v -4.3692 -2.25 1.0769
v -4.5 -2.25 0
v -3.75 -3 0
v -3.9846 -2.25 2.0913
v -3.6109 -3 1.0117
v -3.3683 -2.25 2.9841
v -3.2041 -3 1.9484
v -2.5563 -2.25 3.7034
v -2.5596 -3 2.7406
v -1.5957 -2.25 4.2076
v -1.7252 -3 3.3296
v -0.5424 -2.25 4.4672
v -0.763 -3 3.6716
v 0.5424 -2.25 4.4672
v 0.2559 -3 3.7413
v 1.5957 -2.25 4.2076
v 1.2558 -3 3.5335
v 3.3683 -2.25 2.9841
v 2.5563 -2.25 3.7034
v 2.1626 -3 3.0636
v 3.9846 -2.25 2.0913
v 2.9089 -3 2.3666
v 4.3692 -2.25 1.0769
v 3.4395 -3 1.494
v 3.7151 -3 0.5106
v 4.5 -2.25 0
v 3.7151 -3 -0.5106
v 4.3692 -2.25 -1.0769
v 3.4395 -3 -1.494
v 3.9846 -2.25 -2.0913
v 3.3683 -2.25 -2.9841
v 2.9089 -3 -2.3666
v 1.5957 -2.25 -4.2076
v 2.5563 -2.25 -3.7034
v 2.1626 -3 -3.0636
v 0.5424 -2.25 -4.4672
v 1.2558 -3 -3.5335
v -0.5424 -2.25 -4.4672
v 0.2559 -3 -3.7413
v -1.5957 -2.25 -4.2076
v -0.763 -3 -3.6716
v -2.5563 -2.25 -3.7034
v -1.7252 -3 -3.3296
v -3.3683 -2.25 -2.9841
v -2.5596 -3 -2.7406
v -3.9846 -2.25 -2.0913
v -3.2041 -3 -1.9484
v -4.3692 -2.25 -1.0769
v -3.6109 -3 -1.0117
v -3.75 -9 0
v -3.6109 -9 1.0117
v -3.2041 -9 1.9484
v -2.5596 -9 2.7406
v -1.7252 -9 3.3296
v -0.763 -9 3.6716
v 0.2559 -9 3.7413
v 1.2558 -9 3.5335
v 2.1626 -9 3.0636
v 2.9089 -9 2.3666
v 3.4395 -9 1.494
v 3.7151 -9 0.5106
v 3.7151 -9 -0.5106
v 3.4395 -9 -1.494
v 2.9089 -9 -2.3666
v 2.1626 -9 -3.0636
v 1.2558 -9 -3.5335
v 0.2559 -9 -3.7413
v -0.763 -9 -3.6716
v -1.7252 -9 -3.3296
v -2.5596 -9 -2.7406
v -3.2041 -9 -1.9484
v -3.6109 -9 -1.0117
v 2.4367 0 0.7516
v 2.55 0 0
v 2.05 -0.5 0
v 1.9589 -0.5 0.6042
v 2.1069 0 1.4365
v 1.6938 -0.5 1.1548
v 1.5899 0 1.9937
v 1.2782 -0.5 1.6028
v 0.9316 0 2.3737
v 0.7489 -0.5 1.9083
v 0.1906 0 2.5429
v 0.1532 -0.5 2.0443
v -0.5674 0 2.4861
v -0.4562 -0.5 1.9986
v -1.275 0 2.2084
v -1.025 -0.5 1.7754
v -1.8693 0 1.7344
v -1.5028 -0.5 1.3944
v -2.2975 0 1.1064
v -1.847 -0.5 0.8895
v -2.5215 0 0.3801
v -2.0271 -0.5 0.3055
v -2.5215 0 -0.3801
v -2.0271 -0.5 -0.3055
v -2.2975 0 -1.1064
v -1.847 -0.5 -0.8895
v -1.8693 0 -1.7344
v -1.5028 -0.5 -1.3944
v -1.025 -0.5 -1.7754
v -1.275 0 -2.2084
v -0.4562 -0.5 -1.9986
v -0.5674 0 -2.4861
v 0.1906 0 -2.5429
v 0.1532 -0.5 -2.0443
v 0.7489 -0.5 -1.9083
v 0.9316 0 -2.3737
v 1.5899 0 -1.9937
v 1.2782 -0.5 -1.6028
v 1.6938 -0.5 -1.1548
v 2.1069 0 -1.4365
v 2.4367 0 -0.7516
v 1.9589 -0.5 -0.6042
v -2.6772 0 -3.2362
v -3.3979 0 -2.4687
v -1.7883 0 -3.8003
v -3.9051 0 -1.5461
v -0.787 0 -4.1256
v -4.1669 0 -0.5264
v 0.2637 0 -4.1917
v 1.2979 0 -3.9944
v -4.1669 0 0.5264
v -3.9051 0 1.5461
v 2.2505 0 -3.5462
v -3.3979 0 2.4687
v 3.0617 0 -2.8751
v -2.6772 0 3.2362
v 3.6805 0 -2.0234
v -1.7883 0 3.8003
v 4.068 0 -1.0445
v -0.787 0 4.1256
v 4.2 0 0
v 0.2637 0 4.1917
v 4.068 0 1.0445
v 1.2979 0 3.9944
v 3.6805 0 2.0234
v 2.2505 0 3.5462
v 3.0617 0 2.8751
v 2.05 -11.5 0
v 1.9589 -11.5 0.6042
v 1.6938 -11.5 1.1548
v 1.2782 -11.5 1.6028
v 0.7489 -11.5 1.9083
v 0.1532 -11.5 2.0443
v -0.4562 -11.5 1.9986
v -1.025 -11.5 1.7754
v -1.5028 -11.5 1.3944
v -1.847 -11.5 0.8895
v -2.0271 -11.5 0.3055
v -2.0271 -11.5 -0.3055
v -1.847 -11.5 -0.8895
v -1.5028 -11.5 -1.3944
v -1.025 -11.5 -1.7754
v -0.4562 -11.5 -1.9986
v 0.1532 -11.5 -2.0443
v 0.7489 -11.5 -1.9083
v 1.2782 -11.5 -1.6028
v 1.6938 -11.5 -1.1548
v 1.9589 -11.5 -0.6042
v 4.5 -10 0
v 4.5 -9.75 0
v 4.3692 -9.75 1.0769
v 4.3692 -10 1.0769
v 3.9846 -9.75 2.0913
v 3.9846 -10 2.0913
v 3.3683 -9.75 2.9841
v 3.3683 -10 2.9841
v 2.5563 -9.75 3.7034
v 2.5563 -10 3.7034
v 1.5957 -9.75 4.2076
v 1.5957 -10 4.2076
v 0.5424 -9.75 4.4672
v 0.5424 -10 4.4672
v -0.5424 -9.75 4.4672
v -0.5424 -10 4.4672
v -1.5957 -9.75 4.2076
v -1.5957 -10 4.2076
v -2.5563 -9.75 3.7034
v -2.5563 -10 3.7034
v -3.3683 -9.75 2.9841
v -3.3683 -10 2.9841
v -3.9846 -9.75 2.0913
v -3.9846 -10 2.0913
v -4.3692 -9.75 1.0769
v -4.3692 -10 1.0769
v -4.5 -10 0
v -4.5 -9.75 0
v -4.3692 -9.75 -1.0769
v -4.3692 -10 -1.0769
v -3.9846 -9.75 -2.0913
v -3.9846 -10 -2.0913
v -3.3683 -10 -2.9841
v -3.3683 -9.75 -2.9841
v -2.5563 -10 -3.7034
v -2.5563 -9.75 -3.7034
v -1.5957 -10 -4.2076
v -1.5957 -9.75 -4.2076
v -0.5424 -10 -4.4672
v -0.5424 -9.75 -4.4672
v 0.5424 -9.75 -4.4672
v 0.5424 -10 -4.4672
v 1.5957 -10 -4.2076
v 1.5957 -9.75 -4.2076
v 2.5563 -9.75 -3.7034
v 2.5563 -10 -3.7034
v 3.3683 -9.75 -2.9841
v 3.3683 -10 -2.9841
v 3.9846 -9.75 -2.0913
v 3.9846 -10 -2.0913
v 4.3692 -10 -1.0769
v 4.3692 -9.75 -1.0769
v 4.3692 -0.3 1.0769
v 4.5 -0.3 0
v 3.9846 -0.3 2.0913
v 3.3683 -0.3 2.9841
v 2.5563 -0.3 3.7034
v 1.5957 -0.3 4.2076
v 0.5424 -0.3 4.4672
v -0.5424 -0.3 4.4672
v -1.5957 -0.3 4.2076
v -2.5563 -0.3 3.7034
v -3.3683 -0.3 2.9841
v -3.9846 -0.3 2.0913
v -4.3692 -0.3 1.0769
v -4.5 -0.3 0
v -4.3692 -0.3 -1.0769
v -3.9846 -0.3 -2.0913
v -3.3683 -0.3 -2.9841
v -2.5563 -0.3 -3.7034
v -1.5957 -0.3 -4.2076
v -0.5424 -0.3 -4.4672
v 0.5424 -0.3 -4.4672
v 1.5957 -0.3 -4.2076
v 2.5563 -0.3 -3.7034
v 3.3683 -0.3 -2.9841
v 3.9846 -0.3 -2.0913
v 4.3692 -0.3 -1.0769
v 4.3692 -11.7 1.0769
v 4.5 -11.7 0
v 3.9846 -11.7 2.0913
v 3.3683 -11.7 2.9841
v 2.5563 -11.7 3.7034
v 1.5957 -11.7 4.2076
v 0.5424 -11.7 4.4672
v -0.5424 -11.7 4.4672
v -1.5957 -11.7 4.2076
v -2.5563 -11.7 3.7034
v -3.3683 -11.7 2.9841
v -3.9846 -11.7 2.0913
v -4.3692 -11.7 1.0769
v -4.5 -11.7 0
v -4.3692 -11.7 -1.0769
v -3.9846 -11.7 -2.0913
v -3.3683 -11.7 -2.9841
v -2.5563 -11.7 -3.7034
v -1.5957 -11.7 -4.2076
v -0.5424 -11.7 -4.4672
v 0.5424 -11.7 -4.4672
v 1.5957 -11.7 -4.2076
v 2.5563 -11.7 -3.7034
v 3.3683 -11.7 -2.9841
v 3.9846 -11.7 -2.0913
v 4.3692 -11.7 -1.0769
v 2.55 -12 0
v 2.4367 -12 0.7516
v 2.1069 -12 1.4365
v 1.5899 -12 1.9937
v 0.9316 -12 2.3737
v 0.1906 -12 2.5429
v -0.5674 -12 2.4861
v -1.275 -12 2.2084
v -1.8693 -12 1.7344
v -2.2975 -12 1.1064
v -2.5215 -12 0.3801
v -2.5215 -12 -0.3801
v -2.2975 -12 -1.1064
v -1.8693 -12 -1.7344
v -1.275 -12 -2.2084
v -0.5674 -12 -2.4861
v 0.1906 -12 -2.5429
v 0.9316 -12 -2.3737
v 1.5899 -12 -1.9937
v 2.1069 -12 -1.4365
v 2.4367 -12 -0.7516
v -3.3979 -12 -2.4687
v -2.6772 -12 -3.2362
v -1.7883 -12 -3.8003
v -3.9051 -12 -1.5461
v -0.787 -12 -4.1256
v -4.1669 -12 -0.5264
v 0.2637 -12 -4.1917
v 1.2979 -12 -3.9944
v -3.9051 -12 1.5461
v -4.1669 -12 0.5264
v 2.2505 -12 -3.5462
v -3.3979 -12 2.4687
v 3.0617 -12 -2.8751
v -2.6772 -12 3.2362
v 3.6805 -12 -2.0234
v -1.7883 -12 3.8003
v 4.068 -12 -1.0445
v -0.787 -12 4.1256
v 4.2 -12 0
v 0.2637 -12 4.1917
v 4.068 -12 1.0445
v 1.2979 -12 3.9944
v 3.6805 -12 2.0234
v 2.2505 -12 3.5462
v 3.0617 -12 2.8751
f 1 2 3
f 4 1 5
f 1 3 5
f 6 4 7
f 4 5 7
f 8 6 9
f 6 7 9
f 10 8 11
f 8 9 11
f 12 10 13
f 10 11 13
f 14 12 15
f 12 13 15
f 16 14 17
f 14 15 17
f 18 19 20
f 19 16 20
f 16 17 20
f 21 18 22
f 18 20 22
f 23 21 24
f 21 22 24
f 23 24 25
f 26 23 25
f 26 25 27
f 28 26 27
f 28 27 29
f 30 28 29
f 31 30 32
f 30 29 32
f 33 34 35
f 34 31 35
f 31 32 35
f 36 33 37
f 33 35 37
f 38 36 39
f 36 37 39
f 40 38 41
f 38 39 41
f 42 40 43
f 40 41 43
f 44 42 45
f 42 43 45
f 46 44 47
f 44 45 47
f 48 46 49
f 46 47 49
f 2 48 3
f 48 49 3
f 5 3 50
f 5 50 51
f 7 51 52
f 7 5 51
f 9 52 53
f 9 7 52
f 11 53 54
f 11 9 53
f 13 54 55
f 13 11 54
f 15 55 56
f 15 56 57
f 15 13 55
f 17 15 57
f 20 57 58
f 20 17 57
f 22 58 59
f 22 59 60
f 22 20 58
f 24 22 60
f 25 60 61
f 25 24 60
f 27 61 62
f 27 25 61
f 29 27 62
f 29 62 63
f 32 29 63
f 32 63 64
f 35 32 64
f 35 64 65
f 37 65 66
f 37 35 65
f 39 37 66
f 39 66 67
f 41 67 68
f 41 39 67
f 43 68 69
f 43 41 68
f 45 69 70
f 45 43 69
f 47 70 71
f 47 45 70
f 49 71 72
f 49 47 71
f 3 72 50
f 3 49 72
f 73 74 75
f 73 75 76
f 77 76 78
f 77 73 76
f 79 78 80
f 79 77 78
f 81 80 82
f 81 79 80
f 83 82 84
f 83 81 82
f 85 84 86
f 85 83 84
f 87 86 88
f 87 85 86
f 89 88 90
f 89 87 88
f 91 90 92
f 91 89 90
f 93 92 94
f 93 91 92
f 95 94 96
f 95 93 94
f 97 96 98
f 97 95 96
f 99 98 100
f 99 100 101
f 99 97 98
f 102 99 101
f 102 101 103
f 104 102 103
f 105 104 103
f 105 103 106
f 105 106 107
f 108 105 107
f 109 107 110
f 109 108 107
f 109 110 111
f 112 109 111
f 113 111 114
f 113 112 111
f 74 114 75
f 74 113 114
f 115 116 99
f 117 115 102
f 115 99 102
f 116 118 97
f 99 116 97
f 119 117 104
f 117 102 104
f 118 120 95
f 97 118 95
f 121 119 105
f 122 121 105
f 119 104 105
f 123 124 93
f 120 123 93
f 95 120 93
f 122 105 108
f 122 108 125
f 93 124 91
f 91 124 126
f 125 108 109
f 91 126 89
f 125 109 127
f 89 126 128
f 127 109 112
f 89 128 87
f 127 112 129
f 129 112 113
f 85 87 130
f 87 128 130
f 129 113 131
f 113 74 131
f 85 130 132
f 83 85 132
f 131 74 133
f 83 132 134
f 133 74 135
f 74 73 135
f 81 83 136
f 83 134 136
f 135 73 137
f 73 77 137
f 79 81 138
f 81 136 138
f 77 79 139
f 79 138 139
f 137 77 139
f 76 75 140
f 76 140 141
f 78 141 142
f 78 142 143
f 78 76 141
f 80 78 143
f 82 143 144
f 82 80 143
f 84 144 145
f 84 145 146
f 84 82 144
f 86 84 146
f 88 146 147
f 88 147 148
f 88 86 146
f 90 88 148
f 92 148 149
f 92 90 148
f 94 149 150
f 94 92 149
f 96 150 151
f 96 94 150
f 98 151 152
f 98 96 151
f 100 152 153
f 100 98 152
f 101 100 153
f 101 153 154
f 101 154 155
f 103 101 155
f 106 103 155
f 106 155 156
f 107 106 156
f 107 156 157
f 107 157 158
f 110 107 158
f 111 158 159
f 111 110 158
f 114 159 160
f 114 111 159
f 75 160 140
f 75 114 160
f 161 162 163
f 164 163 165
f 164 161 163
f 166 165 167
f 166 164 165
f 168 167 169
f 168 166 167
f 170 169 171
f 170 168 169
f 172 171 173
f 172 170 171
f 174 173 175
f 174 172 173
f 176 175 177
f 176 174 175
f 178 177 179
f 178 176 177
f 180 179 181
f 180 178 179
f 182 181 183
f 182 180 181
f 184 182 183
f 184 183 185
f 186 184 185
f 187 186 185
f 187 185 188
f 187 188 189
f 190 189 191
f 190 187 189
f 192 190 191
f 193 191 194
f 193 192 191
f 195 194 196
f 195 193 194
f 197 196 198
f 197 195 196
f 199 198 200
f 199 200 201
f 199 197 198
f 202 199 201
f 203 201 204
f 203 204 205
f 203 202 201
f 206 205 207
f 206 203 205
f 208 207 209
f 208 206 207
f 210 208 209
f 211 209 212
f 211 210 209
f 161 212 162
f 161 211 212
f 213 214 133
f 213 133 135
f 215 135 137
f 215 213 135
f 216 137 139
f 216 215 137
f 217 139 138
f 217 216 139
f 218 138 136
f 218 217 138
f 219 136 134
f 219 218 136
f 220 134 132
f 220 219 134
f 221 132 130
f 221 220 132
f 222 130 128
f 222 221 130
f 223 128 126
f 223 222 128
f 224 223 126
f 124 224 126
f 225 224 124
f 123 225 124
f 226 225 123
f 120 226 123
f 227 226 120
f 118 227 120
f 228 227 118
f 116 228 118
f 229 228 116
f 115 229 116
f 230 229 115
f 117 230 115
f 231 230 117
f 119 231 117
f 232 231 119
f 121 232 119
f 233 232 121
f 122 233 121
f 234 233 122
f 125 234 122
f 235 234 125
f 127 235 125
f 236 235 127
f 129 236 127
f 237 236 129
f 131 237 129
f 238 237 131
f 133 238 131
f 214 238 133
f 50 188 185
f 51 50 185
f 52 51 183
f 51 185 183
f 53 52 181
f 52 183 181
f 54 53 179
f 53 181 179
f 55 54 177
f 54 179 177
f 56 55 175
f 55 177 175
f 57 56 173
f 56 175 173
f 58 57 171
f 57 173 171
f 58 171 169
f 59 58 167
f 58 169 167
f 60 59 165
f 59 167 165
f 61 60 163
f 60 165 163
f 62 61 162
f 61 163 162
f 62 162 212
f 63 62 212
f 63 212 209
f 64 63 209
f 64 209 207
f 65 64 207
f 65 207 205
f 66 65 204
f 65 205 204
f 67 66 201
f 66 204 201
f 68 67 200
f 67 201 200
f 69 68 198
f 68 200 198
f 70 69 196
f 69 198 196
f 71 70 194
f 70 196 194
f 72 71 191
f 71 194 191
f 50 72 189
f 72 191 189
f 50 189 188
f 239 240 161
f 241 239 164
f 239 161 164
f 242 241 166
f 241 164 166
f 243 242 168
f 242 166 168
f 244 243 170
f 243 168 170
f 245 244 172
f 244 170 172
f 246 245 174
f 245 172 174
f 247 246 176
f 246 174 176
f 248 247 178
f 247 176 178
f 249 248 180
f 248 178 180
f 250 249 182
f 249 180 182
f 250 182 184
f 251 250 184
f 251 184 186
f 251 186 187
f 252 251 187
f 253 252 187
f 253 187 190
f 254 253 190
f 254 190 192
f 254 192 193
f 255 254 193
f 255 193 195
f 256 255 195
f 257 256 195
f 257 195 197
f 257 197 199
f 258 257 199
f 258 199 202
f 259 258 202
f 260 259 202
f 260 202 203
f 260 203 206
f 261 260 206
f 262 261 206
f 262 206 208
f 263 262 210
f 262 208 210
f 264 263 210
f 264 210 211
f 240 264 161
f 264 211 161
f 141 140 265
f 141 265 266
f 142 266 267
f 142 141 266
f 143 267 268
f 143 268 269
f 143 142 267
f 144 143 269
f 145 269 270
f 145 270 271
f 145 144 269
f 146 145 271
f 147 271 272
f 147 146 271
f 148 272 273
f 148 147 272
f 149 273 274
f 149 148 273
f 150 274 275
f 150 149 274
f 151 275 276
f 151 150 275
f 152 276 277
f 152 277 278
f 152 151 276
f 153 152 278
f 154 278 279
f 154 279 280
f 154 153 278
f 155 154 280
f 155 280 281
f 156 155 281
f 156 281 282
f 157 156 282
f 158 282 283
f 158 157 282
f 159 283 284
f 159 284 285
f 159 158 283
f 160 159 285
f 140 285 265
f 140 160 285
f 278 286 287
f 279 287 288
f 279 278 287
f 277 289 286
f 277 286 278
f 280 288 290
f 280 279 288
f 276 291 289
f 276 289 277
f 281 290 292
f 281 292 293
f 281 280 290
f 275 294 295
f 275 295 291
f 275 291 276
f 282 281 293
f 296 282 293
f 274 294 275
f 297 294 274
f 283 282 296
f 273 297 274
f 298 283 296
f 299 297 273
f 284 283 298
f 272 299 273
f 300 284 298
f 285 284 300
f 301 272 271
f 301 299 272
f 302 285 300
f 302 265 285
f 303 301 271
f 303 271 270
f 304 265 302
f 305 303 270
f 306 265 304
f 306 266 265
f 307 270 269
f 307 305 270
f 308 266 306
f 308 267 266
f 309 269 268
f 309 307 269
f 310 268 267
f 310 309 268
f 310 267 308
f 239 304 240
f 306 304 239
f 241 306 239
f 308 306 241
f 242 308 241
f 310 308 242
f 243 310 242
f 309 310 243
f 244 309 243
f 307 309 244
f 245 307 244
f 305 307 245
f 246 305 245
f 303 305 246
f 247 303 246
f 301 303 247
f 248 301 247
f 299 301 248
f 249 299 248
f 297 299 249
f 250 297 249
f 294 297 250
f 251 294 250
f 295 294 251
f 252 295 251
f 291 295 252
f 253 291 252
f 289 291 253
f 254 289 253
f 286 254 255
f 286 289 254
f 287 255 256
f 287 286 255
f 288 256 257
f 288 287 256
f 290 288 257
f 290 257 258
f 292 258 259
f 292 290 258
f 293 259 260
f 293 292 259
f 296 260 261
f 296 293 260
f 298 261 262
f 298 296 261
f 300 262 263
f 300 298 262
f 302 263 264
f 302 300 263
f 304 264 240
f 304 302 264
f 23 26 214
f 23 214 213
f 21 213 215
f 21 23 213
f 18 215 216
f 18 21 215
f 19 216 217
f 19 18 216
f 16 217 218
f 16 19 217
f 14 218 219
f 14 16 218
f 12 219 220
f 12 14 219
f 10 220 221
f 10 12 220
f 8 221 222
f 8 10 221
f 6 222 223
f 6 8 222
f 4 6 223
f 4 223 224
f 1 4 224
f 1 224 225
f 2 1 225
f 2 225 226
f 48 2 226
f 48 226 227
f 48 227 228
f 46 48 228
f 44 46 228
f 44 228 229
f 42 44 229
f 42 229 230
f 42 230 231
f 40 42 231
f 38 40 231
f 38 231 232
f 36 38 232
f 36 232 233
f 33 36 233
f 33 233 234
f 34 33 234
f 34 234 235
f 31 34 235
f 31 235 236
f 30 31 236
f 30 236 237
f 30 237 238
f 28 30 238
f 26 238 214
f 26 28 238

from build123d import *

# Parameters (mm, degrees)
F0_R         = 4.5
F0_R_2       = 2.05
F1_DEPTH     = 12
F2_SIZE      = 0.3
F3_SIZE      = 0.5
F4_SIZE      = 0.5
F5_SIZE      = 0.3
F6_W         = 0.7801173814
F6_H         = 8
F8_S5_R      = 4.5
F8_T6_DEPTH  = 8
F8_S11_R     = 4.5
F8_T12_DEPTH = 8


# Not quite as in the source:
# - a fillet or chamfer that OpenCascade refuses, or shapes differently, is made with other operations: its cross-section is extruded or revolved along the edge and cut away or added


with BuildPart() as f1:
    # F0 (on Front) → F1 (new body)
    with BuildSketch(Plane.XZ):
        Circle(F0_R)
        Circle(F0_R_2, mode=Mode.SUBTRACT)
    extrude(amount=F1_DEPTH)

    # F2
    f2_edges = [f1.edges().sort_by_distance(p)[0] for p in [
        (-4.5, -12, 0),
    ]]
    chamfer(f2_edges, length=F2_SIZE)

    # F3
    f3_edges = [f1.edges().sort_by_distance(p)[0] for p in [
        (-2.05, -12, 0),
    ]]
    chamfer(f3_edges, length=F3_SIZE)

    # F4
    f4_edges = [f1.edges().sort_by_distance(p)[0] for p in [
        (-2.05, 0, 0),
    ]]
    chamfer(f4_edges, length=F4_SIZE)

    # F5
    f5_edges = [f1.edges().sort_by_distance(p)[0] for p in [
        (-4.5, 0, 0),
    ]]
    chamfer(f5_edges, length=F5_SIZE)

    # F6 (on Top) → F7 (revolve, cut)
    with BuildSketch(Plane.XY):
        with Locations((-4.1400586907, -6)):
            Rectangle(F6_W, F6_H)
    revolve(axis=Axis((0, 2.6414038148, 0), (0, 1, 0)), mode=Mode.SUBTRACT)

    # F8: chamfer of 1 on 3 edges, made by hand


with BuildPart() as f8_tool2:
    # F8_s3 → F8_t4 (revolve)
    with BuildSketch(Plane.XY):
        Polygon((-3.75, -9), (-4.75, -10), (-3.75, -10), align=None)
    revolve(axis=Axis((0, -10, 0), (0, 1, 0)))

    # F8_s5 → F8_t6 (intersect, symmetric)
    with BuildSketch(Plane.XZ.offset(9.5)):
        Circle(F8_S5_R)
    extrude(amount=F8_T6_DEPTH, both=True, mode=Mode.INTERSECT)


with BuildPart() as f1_1:
    add(f1.part)

    # F8_t1: union F8_tool2
    add(f8_tool2.part)


with BuildPart() as f8_tool8:
    # F8_s9 → F8_t10 (revolve)
    with BuildSketch(Plane.XY):
        Polygon((-4.75, -2), (-3.75, -3), (-3.75, -2), align=None)
    revolve(axis=Axis((0, -2, 0), (0, 1, 0)))

    # F8_s11 → F8_t12 (intersect, symmetric)
    with BuildSketch(Plane.XZ.offset(2.5)):
        Circle(F8_S11_R)
    extrude(amount=F8_T12_DEPTH, both=True, mode=Mode.INTERSECT)


with BuildPart() as f1_2:
    add(f1_1.part)

    # F8_t7: union F8_tool8
    add(f8_tool8.part)


solid = f1_2.part
